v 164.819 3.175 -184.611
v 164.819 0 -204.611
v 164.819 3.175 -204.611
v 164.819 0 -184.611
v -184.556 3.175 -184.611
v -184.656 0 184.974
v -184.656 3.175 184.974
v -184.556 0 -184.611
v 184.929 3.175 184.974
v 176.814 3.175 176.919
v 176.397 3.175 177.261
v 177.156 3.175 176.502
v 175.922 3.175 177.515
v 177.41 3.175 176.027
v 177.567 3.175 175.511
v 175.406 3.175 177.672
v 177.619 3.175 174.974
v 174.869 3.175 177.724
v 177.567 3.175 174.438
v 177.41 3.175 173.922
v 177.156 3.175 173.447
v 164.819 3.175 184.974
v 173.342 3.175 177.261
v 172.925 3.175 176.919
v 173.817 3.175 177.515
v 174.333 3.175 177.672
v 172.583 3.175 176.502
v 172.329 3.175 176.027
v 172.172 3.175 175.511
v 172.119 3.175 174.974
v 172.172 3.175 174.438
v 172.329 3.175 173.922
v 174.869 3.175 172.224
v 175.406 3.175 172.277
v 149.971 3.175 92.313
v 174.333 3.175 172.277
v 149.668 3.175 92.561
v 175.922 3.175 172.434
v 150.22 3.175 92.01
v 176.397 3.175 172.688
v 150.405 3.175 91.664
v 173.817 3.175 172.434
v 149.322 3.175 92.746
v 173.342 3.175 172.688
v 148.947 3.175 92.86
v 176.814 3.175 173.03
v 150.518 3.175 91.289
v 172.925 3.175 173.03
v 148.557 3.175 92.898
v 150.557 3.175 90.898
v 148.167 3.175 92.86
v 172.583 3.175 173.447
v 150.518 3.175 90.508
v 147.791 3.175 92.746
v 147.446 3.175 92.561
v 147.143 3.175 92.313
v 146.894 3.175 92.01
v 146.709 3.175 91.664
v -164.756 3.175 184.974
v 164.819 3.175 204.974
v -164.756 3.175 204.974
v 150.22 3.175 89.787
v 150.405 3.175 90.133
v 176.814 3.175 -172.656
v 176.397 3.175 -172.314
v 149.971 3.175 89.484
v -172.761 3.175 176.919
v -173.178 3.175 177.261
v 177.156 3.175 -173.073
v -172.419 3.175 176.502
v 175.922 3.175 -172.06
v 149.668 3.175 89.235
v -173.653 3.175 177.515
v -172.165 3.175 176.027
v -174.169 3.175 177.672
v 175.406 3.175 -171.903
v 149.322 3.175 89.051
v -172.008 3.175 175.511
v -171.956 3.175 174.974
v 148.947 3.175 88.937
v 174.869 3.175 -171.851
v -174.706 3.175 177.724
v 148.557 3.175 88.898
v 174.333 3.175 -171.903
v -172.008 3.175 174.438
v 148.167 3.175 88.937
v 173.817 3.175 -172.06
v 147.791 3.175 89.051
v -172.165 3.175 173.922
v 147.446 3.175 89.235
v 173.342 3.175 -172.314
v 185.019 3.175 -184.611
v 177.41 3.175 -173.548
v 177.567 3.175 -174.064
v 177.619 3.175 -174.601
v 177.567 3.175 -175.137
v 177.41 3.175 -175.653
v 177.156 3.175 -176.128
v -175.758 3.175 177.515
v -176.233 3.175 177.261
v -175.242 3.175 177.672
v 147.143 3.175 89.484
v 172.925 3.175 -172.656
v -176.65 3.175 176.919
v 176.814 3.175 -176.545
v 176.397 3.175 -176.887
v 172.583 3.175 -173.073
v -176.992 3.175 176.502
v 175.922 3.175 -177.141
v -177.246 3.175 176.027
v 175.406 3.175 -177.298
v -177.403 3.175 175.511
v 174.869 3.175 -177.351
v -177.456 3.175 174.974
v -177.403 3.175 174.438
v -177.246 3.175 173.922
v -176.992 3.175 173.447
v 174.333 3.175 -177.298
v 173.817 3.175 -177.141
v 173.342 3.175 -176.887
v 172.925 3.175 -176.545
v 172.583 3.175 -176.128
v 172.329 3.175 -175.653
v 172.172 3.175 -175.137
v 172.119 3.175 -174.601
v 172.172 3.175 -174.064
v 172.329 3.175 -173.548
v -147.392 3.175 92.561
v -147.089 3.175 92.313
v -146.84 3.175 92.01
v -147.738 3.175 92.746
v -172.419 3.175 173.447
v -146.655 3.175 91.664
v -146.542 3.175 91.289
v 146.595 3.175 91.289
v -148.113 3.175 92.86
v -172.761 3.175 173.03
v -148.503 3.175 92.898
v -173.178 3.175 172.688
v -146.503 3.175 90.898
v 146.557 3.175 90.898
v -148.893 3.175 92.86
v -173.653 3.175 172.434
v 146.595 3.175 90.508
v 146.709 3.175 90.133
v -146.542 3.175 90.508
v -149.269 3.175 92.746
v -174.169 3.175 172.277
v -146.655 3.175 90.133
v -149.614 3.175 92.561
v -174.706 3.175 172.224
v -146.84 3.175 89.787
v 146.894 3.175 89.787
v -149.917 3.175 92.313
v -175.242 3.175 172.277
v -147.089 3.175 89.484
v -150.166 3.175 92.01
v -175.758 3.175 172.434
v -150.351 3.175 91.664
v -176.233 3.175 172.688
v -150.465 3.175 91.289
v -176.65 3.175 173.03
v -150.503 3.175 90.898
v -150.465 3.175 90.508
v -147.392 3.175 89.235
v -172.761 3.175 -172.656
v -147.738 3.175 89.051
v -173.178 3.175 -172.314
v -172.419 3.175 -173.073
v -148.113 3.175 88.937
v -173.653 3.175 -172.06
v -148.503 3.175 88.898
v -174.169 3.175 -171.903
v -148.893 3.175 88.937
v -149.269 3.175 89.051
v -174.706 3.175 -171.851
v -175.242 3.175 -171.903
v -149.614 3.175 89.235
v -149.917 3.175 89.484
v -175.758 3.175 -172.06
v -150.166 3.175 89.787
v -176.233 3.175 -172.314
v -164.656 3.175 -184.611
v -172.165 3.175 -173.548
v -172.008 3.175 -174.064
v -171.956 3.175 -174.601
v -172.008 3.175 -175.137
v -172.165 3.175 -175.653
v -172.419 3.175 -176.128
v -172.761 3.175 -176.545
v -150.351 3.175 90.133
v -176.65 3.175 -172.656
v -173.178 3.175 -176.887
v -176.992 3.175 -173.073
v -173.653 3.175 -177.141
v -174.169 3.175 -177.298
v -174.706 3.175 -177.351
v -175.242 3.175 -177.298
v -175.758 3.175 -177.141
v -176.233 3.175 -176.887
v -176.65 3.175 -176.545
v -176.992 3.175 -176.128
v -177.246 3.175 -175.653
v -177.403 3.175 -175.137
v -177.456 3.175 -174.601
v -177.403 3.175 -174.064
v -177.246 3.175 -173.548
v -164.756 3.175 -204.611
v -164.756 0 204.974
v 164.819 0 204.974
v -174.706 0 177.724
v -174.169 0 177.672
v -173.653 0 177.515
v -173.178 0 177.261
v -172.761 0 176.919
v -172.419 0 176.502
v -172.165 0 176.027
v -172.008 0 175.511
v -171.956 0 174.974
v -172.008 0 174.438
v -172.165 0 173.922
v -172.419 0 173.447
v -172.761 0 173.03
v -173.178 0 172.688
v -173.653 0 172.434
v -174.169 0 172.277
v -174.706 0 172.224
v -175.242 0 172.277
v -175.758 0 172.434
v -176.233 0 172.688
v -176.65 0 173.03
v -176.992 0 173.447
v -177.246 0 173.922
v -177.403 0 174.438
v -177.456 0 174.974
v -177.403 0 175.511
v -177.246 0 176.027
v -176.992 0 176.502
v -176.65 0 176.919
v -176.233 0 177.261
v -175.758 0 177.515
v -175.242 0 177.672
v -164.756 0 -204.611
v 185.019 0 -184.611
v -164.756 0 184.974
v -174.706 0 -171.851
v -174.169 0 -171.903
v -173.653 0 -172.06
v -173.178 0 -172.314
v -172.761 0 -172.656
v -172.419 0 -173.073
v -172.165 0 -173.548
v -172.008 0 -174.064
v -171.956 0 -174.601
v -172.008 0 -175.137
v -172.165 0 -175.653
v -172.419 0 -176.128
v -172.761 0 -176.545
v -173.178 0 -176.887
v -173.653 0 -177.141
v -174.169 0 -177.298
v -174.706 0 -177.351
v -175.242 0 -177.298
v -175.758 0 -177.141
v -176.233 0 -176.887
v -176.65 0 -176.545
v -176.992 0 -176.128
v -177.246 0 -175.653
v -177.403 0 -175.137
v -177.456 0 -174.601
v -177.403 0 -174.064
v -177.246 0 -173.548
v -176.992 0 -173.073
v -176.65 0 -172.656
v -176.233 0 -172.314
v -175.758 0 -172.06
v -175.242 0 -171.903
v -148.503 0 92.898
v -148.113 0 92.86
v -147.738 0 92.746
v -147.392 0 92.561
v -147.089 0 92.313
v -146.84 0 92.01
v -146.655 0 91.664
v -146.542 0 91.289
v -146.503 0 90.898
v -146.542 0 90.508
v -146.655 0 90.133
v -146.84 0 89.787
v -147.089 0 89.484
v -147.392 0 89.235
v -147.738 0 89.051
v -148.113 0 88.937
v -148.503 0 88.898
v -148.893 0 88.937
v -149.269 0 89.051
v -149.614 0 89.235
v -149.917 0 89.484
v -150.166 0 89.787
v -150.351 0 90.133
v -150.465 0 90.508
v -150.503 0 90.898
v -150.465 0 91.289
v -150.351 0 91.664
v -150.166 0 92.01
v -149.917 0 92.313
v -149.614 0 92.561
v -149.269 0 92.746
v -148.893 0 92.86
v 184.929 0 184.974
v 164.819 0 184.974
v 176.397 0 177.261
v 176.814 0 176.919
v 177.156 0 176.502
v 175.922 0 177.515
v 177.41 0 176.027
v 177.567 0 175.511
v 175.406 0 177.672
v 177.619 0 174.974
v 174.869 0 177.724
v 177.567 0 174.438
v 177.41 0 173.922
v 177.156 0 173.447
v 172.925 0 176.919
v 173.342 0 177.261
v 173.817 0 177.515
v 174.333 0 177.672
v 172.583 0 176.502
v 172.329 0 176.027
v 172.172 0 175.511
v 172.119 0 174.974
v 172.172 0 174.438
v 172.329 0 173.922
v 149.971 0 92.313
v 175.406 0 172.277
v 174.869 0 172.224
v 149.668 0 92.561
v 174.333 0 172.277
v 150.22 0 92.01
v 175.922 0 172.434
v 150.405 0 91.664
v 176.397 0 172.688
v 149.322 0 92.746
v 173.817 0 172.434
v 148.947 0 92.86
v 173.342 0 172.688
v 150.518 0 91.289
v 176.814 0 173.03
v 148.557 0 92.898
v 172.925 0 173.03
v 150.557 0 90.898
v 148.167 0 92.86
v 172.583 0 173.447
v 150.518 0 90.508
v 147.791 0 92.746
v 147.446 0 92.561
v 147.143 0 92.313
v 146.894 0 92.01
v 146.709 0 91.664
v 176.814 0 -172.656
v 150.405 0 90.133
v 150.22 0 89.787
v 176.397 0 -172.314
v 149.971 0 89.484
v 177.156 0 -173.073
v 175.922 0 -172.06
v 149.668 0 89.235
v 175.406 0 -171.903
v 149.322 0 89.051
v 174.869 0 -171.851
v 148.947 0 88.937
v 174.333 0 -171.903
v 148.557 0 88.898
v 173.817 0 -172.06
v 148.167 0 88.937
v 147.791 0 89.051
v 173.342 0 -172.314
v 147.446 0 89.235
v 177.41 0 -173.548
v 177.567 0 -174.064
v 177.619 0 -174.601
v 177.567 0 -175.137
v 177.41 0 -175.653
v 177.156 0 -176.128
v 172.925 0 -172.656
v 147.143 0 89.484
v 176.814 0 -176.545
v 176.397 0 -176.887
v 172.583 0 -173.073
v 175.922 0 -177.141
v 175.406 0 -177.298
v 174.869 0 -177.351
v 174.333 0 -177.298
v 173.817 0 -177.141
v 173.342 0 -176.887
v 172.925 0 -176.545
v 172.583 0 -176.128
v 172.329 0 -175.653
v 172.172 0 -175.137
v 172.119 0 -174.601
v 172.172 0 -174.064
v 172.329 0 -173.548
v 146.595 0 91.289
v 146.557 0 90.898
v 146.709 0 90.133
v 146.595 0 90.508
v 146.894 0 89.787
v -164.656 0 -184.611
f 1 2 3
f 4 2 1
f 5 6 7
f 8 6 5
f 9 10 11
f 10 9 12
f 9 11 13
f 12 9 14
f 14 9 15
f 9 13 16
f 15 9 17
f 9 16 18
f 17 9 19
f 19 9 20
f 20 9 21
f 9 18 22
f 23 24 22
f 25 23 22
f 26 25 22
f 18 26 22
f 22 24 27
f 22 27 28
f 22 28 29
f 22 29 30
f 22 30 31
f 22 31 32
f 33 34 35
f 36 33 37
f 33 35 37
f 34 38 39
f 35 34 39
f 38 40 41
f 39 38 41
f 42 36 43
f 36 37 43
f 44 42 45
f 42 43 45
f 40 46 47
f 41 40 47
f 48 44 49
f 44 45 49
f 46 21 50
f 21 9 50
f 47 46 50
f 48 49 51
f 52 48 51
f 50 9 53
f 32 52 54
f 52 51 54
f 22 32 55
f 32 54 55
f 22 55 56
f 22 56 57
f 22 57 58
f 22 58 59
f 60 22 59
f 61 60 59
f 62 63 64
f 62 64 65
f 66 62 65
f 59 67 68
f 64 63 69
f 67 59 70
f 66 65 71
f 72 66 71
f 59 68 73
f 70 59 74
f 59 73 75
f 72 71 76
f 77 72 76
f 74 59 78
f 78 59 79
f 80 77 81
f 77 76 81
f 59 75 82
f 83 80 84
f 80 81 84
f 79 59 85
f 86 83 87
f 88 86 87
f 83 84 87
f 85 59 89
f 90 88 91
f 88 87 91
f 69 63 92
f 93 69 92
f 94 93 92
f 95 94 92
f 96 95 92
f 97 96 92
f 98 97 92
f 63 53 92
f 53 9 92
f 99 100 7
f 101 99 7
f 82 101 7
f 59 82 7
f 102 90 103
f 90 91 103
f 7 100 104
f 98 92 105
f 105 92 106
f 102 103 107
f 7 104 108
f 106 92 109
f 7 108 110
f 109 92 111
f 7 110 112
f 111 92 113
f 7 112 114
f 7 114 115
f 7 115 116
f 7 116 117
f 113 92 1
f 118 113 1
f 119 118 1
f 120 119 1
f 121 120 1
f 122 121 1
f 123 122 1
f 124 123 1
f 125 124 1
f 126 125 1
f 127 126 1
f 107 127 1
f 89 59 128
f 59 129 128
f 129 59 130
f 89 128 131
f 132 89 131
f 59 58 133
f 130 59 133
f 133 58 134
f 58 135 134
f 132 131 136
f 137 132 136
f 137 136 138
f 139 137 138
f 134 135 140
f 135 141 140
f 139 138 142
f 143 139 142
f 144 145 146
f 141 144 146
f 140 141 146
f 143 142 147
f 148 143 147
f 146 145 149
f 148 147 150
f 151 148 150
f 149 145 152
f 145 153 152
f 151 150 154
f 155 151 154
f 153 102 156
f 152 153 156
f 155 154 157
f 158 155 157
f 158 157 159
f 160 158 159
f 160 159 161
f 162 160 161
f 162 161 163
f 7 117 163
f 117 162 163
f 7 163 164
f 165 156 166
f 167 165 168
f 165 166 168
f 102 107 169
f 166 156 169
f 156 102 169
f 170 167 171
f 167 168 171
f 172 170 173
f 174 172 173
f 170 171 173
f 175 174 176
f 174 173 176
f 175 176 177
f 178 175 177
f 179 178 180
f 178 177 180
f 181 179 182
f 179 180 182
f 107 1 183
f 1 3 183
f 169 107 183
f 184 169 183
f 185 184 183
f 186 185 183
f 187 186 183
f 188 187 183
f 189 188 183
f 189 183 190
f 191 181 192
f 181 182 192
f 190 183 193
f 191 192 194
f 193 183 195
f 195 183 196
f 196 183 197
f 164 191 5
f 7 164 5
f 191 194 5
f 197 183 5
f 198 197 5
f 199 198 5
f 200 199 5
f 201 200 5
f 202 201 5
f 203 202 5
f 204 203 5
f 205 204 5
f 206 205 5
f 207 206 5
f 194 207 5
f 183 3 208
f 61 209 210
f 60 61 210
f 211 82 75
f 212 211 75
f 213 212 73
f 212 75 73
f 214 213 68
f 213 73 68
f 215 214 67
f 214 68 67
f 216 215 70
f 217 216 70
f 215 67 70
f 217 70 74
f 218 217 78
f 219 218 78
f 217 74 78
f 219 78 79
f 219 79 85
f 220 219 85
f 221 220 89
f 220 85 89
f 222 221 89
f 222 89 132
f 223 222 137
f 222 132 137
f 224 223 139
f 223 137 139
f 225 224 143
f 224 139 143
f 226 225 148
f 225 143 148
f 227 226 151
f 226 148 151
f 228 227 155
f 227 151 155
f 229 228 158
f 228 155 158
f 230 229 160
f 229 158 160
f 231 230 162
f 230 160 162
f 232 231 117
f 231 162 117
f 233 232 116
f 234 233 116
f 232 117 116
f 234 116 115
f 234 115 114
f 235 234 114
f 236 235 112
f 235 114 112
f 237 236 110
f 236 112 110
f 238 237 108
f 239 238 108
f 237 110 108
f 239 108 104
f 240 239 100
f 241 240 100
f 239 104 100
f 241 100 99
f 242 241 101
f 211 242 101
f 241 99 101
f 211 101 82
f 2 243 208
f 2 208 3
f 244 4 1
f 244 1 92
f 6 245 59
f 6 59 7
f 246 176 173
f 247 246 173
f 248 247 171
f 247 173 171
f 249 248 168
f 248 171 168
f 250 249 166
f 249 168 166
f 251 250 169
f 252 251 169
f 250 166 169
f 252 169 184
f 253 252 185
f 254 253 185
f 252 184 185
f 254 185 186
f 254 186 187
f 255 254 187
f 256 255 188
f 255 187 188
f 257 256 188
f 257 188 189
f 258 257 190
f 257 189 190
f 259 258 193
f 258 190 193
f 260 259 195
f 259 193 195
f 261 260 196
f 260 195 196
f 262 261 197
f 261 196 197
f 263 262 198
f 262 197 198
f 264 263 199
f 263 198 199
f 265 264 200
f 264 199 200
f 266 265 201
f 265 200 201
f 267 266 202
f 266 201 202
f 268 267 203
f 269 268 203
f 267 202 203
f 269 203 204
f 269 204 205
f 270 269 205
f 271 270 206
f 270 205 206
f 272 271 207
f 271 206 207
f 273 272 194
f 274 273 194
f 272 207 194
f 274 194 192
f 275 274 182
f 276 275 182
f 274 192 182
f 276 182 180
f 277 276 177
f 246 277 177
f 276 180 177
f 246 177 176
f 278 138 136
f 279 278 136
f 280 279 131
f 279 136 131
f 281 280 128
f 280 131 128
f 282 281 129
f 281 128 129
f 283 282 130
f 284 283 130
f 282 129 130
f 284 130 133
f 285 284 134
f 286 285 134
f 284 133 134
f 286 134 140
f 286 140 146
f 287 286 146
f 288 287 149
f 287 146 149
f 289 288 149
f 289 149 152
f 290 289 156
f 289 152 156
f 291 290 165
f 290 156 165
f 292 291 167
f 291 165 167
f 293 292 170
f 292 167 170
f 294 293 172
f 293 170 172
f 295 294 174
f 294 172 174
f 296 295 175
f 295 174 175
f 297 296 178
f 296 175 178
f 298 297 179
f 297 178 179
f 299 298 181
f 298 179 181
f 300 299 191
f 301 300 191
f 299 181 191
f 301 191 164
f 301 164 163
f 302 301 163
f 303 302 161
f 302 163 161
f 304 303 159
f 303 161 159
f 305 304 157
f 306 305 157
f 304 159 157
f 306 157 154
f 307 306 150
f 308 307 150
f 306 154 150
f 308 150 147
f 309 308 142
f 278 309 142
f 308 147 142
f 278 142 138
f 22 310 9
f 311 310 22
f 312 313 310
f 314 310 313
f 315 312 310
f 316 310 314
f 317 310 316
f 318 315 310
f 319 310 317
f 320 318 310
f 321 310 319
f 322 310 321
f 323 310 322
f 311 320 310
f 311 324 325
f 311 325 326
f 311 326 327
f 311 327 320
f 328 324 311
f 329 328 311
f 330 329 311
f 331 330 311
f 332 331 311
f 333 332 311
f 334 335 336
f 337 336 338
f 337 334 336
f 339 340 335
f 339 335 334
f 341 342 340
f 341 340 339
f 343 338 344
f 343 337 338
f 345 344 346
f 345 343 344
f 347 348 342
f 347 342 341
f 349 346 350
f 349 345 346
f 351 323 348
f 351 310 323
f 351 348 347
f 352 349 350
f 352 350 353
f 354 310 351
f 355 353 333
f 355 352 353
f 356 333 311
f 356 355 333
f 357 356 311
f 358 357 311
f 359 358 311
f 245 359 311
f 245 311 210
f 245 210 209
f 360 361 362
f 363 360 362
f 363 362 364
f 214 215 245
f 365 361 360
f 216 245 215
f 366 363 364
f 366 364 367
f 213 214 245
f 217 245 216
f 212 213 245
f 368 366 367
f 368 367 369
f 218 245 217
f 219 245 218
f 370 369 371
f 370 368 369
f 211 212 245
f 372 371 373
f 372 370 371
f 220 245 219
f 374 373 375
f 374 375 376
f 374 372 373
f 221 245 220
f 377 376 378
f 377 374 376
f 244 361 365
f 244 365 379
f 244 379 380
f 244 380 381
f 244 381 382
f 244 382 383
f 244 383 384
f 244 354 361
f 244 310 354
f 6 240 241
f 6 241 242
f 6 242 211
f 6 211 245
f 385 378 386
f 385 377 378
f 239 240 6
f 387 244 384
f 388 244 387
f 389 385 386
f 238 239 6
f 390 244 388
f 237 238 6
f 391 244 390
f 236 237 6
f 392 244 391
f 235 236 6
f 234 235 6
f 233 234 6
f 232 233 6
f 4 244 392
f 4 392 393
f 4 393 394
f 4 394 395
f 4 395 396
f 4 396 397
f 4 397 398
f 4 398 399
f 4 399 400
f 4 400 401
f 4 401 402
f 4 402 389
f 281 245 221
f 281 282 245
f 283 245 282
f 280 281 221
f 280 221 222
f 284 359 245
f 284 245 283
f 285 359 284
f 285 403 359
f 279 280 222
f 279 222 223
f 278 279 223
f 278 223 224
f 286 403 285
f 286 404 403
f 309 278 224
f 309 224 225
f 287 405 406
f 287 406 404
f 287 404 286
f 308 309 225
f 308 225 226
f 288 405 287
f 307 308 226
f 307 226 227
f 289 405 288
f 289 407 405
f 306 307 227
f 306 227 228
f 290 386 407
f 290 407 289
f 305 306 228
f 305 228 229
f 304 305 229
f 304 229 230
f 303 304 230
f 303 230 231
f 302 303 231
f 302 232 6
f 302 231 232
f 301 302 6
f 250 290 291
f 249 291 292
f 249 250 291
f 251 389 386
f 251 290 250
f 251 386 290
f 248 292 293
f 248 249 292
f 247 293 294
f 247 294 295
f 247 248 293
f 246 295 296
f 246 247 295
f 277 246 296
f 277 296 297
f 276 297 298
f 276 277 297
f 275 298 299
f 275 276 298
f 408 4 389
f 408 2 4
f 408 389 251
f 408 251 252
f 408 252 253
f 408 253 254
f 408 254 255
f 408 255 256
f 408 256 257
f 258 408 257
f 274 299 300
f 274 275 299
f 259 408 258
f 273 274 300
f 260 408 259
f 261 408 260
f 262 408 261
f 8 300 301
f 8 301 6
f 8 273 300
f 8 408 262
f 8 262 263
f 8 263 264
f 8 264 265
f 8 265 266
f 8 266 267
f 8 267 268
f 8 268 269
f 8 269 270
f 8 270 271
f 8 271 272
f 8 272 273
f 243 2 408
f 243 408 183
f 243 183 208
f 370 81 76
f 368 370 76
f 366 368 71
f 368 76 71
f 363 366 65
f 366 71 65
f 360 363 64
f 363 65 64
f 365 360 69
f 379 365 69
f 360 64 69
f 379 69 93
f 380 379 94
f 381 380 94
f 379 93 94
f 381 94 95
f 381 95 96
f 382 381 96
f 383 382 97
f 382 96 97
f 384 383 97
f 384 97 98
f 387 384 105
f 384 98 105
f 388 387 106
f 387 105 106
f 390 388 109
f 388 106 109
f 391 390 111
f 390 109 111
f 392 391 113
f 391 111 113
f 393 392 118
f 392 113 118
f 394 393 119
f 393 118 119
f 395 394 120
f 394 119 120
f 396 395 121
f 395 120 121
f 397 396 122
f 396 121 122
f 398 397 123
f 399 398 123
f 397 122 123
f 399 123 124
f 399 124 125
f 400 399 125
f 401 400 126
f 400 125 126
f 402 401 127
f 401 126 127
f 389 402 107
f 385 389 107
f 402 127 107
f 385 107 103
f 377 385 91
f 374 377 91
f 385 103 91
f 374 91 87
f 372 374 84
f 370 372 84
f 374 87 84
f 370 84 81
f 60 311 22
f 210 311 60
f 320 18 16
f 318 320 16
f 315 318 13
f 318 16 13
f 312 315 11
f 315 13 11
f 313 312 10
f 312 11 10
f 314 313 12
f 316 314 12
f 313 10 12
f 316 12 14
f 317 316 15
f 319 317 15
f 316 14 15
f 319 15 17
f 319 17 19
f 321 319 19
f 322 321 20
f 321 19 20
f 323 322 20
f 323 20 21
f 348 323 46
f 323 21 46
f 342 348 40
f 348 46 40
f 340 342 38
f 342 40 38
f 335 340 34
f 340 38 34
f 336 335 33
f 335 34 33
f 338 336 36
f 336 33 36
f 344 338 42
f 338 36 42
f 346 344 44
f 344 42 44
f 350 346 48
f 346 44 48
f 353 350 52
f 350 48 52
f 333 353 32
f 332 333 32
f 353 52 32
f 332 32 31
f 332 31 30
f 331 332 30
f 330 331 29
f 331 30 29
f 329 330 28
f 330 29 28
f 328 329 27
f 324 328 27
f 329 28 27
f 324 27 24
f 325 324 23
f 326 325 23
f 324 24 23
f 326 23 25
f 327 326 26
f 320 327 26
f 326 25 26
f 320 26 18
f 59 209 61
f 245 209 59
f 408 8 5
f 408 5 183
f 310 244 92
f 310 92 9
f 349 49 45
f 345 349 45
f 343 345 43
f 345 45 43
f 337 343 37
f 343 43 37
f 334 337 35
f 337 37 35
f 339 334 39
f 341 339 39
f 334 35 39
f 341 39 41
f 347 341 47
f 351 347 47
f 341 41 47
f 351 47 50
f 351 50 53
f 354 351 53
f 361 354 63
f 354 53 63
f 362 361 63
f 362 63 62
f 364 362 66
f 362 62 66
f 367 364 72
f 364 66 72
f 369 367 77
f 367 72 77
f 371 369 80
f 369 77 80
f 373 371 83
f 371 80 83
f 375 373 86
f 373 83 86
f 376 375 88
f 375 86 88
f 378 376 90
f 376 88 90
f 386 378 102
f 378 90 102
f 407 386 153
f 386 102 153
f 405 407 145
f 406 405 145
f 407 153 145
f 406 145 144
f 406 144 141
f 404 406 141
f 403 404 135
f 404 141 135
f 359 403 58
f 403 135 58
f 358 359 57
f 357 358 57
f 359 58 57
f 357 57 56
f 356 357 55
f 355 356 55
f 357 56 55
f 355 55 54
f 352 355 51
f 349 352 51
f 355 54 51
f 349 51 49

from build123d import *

# Parameters (mm, degrees)
BOSS_EXTRUDE1_DEPTH = 3.175
SKETCH2_R           = 2.75
CUT_EXTRUDE1_DEPTH  = 3.175
SKETCH3_R           = 2
CUT_EXTRUDE2_DEPTH  = 3.175


with BuildPart() as part:
    # Sketch1 → Boss-Extrude1 (new body)
    with BuildSketch(Plane(origin=(0, 0, 0), x_dir=(1, 0, 0), z_dir=(0, 1, 0))):
        Polygon((-164.75564006, -204.974359939), (-164.75564006, -184.974359939), (-184.65564006, -184.974359939), (-184.55564006, 184.61064006), (-164.65564006, 184.61064006), (-164.75564006, 204.61064006), (164.81935994, 204.61064006), (164.81935994, 184.61064006), (185.01935994, 184.61064006), (184.92935994, -184.974359939), (164.81935994, -184.974359939), (164.81935994, -204.974359939), (-163.362720717, -204.974359939), align=None)
    extrude(amount=BOSS_EXTRUDE1_DEPTH)

    # Sketch2 → Cut-Extrude1 (cut)
    with BuildSketch(Plane(origin=(0, 3.175, 0), x_dir=(1, 0, 0), z_dir=(0, 1, 0))):
        with Locations(Location((-174.70564006, -174.974360305, 0), (0, 0, 270))):
            Circle(SKETCH2_R)
        with Locations(Location((174.86935994, -174.974360305, 0), (0, 0, 270))):
            Circle(SKETCH2_R)
        with Locations(Location((174.86935994, 174.600639695, 0), (0, 0, 270))):
            Circle(SKETCH2_R)
        with Locations(Location((-174.70564006, 174.600639695, 0), (0, 0, 270))):
            Circle(SKETCH2_R)
    extrude(amount=-CUT_EXTRUDE1_DEPTH, mode=Mode.SUBTRACT)

    # Sketch3 → Cut-Extrude2 (cut)
    with BuildSketch(Plane(origin=(0, 3.175, 0), x_dir=(1, 0, 0), z_dir=(0, 1, 0))):
        with Locations(Location((-148.50314006, -90.898359939, 0), (0, 0, 270))):
            Circle(SKETCH3_R)
        with Locations(Location((148.55685994, -90.898359939, 0), (0, 0, 270))):
            Circle(SKETCH3_R)
    extrude(amount=-CUT_EXTRUDE2_DEPTH, mode=Mode.SUBTRACT)


solid = part.part
